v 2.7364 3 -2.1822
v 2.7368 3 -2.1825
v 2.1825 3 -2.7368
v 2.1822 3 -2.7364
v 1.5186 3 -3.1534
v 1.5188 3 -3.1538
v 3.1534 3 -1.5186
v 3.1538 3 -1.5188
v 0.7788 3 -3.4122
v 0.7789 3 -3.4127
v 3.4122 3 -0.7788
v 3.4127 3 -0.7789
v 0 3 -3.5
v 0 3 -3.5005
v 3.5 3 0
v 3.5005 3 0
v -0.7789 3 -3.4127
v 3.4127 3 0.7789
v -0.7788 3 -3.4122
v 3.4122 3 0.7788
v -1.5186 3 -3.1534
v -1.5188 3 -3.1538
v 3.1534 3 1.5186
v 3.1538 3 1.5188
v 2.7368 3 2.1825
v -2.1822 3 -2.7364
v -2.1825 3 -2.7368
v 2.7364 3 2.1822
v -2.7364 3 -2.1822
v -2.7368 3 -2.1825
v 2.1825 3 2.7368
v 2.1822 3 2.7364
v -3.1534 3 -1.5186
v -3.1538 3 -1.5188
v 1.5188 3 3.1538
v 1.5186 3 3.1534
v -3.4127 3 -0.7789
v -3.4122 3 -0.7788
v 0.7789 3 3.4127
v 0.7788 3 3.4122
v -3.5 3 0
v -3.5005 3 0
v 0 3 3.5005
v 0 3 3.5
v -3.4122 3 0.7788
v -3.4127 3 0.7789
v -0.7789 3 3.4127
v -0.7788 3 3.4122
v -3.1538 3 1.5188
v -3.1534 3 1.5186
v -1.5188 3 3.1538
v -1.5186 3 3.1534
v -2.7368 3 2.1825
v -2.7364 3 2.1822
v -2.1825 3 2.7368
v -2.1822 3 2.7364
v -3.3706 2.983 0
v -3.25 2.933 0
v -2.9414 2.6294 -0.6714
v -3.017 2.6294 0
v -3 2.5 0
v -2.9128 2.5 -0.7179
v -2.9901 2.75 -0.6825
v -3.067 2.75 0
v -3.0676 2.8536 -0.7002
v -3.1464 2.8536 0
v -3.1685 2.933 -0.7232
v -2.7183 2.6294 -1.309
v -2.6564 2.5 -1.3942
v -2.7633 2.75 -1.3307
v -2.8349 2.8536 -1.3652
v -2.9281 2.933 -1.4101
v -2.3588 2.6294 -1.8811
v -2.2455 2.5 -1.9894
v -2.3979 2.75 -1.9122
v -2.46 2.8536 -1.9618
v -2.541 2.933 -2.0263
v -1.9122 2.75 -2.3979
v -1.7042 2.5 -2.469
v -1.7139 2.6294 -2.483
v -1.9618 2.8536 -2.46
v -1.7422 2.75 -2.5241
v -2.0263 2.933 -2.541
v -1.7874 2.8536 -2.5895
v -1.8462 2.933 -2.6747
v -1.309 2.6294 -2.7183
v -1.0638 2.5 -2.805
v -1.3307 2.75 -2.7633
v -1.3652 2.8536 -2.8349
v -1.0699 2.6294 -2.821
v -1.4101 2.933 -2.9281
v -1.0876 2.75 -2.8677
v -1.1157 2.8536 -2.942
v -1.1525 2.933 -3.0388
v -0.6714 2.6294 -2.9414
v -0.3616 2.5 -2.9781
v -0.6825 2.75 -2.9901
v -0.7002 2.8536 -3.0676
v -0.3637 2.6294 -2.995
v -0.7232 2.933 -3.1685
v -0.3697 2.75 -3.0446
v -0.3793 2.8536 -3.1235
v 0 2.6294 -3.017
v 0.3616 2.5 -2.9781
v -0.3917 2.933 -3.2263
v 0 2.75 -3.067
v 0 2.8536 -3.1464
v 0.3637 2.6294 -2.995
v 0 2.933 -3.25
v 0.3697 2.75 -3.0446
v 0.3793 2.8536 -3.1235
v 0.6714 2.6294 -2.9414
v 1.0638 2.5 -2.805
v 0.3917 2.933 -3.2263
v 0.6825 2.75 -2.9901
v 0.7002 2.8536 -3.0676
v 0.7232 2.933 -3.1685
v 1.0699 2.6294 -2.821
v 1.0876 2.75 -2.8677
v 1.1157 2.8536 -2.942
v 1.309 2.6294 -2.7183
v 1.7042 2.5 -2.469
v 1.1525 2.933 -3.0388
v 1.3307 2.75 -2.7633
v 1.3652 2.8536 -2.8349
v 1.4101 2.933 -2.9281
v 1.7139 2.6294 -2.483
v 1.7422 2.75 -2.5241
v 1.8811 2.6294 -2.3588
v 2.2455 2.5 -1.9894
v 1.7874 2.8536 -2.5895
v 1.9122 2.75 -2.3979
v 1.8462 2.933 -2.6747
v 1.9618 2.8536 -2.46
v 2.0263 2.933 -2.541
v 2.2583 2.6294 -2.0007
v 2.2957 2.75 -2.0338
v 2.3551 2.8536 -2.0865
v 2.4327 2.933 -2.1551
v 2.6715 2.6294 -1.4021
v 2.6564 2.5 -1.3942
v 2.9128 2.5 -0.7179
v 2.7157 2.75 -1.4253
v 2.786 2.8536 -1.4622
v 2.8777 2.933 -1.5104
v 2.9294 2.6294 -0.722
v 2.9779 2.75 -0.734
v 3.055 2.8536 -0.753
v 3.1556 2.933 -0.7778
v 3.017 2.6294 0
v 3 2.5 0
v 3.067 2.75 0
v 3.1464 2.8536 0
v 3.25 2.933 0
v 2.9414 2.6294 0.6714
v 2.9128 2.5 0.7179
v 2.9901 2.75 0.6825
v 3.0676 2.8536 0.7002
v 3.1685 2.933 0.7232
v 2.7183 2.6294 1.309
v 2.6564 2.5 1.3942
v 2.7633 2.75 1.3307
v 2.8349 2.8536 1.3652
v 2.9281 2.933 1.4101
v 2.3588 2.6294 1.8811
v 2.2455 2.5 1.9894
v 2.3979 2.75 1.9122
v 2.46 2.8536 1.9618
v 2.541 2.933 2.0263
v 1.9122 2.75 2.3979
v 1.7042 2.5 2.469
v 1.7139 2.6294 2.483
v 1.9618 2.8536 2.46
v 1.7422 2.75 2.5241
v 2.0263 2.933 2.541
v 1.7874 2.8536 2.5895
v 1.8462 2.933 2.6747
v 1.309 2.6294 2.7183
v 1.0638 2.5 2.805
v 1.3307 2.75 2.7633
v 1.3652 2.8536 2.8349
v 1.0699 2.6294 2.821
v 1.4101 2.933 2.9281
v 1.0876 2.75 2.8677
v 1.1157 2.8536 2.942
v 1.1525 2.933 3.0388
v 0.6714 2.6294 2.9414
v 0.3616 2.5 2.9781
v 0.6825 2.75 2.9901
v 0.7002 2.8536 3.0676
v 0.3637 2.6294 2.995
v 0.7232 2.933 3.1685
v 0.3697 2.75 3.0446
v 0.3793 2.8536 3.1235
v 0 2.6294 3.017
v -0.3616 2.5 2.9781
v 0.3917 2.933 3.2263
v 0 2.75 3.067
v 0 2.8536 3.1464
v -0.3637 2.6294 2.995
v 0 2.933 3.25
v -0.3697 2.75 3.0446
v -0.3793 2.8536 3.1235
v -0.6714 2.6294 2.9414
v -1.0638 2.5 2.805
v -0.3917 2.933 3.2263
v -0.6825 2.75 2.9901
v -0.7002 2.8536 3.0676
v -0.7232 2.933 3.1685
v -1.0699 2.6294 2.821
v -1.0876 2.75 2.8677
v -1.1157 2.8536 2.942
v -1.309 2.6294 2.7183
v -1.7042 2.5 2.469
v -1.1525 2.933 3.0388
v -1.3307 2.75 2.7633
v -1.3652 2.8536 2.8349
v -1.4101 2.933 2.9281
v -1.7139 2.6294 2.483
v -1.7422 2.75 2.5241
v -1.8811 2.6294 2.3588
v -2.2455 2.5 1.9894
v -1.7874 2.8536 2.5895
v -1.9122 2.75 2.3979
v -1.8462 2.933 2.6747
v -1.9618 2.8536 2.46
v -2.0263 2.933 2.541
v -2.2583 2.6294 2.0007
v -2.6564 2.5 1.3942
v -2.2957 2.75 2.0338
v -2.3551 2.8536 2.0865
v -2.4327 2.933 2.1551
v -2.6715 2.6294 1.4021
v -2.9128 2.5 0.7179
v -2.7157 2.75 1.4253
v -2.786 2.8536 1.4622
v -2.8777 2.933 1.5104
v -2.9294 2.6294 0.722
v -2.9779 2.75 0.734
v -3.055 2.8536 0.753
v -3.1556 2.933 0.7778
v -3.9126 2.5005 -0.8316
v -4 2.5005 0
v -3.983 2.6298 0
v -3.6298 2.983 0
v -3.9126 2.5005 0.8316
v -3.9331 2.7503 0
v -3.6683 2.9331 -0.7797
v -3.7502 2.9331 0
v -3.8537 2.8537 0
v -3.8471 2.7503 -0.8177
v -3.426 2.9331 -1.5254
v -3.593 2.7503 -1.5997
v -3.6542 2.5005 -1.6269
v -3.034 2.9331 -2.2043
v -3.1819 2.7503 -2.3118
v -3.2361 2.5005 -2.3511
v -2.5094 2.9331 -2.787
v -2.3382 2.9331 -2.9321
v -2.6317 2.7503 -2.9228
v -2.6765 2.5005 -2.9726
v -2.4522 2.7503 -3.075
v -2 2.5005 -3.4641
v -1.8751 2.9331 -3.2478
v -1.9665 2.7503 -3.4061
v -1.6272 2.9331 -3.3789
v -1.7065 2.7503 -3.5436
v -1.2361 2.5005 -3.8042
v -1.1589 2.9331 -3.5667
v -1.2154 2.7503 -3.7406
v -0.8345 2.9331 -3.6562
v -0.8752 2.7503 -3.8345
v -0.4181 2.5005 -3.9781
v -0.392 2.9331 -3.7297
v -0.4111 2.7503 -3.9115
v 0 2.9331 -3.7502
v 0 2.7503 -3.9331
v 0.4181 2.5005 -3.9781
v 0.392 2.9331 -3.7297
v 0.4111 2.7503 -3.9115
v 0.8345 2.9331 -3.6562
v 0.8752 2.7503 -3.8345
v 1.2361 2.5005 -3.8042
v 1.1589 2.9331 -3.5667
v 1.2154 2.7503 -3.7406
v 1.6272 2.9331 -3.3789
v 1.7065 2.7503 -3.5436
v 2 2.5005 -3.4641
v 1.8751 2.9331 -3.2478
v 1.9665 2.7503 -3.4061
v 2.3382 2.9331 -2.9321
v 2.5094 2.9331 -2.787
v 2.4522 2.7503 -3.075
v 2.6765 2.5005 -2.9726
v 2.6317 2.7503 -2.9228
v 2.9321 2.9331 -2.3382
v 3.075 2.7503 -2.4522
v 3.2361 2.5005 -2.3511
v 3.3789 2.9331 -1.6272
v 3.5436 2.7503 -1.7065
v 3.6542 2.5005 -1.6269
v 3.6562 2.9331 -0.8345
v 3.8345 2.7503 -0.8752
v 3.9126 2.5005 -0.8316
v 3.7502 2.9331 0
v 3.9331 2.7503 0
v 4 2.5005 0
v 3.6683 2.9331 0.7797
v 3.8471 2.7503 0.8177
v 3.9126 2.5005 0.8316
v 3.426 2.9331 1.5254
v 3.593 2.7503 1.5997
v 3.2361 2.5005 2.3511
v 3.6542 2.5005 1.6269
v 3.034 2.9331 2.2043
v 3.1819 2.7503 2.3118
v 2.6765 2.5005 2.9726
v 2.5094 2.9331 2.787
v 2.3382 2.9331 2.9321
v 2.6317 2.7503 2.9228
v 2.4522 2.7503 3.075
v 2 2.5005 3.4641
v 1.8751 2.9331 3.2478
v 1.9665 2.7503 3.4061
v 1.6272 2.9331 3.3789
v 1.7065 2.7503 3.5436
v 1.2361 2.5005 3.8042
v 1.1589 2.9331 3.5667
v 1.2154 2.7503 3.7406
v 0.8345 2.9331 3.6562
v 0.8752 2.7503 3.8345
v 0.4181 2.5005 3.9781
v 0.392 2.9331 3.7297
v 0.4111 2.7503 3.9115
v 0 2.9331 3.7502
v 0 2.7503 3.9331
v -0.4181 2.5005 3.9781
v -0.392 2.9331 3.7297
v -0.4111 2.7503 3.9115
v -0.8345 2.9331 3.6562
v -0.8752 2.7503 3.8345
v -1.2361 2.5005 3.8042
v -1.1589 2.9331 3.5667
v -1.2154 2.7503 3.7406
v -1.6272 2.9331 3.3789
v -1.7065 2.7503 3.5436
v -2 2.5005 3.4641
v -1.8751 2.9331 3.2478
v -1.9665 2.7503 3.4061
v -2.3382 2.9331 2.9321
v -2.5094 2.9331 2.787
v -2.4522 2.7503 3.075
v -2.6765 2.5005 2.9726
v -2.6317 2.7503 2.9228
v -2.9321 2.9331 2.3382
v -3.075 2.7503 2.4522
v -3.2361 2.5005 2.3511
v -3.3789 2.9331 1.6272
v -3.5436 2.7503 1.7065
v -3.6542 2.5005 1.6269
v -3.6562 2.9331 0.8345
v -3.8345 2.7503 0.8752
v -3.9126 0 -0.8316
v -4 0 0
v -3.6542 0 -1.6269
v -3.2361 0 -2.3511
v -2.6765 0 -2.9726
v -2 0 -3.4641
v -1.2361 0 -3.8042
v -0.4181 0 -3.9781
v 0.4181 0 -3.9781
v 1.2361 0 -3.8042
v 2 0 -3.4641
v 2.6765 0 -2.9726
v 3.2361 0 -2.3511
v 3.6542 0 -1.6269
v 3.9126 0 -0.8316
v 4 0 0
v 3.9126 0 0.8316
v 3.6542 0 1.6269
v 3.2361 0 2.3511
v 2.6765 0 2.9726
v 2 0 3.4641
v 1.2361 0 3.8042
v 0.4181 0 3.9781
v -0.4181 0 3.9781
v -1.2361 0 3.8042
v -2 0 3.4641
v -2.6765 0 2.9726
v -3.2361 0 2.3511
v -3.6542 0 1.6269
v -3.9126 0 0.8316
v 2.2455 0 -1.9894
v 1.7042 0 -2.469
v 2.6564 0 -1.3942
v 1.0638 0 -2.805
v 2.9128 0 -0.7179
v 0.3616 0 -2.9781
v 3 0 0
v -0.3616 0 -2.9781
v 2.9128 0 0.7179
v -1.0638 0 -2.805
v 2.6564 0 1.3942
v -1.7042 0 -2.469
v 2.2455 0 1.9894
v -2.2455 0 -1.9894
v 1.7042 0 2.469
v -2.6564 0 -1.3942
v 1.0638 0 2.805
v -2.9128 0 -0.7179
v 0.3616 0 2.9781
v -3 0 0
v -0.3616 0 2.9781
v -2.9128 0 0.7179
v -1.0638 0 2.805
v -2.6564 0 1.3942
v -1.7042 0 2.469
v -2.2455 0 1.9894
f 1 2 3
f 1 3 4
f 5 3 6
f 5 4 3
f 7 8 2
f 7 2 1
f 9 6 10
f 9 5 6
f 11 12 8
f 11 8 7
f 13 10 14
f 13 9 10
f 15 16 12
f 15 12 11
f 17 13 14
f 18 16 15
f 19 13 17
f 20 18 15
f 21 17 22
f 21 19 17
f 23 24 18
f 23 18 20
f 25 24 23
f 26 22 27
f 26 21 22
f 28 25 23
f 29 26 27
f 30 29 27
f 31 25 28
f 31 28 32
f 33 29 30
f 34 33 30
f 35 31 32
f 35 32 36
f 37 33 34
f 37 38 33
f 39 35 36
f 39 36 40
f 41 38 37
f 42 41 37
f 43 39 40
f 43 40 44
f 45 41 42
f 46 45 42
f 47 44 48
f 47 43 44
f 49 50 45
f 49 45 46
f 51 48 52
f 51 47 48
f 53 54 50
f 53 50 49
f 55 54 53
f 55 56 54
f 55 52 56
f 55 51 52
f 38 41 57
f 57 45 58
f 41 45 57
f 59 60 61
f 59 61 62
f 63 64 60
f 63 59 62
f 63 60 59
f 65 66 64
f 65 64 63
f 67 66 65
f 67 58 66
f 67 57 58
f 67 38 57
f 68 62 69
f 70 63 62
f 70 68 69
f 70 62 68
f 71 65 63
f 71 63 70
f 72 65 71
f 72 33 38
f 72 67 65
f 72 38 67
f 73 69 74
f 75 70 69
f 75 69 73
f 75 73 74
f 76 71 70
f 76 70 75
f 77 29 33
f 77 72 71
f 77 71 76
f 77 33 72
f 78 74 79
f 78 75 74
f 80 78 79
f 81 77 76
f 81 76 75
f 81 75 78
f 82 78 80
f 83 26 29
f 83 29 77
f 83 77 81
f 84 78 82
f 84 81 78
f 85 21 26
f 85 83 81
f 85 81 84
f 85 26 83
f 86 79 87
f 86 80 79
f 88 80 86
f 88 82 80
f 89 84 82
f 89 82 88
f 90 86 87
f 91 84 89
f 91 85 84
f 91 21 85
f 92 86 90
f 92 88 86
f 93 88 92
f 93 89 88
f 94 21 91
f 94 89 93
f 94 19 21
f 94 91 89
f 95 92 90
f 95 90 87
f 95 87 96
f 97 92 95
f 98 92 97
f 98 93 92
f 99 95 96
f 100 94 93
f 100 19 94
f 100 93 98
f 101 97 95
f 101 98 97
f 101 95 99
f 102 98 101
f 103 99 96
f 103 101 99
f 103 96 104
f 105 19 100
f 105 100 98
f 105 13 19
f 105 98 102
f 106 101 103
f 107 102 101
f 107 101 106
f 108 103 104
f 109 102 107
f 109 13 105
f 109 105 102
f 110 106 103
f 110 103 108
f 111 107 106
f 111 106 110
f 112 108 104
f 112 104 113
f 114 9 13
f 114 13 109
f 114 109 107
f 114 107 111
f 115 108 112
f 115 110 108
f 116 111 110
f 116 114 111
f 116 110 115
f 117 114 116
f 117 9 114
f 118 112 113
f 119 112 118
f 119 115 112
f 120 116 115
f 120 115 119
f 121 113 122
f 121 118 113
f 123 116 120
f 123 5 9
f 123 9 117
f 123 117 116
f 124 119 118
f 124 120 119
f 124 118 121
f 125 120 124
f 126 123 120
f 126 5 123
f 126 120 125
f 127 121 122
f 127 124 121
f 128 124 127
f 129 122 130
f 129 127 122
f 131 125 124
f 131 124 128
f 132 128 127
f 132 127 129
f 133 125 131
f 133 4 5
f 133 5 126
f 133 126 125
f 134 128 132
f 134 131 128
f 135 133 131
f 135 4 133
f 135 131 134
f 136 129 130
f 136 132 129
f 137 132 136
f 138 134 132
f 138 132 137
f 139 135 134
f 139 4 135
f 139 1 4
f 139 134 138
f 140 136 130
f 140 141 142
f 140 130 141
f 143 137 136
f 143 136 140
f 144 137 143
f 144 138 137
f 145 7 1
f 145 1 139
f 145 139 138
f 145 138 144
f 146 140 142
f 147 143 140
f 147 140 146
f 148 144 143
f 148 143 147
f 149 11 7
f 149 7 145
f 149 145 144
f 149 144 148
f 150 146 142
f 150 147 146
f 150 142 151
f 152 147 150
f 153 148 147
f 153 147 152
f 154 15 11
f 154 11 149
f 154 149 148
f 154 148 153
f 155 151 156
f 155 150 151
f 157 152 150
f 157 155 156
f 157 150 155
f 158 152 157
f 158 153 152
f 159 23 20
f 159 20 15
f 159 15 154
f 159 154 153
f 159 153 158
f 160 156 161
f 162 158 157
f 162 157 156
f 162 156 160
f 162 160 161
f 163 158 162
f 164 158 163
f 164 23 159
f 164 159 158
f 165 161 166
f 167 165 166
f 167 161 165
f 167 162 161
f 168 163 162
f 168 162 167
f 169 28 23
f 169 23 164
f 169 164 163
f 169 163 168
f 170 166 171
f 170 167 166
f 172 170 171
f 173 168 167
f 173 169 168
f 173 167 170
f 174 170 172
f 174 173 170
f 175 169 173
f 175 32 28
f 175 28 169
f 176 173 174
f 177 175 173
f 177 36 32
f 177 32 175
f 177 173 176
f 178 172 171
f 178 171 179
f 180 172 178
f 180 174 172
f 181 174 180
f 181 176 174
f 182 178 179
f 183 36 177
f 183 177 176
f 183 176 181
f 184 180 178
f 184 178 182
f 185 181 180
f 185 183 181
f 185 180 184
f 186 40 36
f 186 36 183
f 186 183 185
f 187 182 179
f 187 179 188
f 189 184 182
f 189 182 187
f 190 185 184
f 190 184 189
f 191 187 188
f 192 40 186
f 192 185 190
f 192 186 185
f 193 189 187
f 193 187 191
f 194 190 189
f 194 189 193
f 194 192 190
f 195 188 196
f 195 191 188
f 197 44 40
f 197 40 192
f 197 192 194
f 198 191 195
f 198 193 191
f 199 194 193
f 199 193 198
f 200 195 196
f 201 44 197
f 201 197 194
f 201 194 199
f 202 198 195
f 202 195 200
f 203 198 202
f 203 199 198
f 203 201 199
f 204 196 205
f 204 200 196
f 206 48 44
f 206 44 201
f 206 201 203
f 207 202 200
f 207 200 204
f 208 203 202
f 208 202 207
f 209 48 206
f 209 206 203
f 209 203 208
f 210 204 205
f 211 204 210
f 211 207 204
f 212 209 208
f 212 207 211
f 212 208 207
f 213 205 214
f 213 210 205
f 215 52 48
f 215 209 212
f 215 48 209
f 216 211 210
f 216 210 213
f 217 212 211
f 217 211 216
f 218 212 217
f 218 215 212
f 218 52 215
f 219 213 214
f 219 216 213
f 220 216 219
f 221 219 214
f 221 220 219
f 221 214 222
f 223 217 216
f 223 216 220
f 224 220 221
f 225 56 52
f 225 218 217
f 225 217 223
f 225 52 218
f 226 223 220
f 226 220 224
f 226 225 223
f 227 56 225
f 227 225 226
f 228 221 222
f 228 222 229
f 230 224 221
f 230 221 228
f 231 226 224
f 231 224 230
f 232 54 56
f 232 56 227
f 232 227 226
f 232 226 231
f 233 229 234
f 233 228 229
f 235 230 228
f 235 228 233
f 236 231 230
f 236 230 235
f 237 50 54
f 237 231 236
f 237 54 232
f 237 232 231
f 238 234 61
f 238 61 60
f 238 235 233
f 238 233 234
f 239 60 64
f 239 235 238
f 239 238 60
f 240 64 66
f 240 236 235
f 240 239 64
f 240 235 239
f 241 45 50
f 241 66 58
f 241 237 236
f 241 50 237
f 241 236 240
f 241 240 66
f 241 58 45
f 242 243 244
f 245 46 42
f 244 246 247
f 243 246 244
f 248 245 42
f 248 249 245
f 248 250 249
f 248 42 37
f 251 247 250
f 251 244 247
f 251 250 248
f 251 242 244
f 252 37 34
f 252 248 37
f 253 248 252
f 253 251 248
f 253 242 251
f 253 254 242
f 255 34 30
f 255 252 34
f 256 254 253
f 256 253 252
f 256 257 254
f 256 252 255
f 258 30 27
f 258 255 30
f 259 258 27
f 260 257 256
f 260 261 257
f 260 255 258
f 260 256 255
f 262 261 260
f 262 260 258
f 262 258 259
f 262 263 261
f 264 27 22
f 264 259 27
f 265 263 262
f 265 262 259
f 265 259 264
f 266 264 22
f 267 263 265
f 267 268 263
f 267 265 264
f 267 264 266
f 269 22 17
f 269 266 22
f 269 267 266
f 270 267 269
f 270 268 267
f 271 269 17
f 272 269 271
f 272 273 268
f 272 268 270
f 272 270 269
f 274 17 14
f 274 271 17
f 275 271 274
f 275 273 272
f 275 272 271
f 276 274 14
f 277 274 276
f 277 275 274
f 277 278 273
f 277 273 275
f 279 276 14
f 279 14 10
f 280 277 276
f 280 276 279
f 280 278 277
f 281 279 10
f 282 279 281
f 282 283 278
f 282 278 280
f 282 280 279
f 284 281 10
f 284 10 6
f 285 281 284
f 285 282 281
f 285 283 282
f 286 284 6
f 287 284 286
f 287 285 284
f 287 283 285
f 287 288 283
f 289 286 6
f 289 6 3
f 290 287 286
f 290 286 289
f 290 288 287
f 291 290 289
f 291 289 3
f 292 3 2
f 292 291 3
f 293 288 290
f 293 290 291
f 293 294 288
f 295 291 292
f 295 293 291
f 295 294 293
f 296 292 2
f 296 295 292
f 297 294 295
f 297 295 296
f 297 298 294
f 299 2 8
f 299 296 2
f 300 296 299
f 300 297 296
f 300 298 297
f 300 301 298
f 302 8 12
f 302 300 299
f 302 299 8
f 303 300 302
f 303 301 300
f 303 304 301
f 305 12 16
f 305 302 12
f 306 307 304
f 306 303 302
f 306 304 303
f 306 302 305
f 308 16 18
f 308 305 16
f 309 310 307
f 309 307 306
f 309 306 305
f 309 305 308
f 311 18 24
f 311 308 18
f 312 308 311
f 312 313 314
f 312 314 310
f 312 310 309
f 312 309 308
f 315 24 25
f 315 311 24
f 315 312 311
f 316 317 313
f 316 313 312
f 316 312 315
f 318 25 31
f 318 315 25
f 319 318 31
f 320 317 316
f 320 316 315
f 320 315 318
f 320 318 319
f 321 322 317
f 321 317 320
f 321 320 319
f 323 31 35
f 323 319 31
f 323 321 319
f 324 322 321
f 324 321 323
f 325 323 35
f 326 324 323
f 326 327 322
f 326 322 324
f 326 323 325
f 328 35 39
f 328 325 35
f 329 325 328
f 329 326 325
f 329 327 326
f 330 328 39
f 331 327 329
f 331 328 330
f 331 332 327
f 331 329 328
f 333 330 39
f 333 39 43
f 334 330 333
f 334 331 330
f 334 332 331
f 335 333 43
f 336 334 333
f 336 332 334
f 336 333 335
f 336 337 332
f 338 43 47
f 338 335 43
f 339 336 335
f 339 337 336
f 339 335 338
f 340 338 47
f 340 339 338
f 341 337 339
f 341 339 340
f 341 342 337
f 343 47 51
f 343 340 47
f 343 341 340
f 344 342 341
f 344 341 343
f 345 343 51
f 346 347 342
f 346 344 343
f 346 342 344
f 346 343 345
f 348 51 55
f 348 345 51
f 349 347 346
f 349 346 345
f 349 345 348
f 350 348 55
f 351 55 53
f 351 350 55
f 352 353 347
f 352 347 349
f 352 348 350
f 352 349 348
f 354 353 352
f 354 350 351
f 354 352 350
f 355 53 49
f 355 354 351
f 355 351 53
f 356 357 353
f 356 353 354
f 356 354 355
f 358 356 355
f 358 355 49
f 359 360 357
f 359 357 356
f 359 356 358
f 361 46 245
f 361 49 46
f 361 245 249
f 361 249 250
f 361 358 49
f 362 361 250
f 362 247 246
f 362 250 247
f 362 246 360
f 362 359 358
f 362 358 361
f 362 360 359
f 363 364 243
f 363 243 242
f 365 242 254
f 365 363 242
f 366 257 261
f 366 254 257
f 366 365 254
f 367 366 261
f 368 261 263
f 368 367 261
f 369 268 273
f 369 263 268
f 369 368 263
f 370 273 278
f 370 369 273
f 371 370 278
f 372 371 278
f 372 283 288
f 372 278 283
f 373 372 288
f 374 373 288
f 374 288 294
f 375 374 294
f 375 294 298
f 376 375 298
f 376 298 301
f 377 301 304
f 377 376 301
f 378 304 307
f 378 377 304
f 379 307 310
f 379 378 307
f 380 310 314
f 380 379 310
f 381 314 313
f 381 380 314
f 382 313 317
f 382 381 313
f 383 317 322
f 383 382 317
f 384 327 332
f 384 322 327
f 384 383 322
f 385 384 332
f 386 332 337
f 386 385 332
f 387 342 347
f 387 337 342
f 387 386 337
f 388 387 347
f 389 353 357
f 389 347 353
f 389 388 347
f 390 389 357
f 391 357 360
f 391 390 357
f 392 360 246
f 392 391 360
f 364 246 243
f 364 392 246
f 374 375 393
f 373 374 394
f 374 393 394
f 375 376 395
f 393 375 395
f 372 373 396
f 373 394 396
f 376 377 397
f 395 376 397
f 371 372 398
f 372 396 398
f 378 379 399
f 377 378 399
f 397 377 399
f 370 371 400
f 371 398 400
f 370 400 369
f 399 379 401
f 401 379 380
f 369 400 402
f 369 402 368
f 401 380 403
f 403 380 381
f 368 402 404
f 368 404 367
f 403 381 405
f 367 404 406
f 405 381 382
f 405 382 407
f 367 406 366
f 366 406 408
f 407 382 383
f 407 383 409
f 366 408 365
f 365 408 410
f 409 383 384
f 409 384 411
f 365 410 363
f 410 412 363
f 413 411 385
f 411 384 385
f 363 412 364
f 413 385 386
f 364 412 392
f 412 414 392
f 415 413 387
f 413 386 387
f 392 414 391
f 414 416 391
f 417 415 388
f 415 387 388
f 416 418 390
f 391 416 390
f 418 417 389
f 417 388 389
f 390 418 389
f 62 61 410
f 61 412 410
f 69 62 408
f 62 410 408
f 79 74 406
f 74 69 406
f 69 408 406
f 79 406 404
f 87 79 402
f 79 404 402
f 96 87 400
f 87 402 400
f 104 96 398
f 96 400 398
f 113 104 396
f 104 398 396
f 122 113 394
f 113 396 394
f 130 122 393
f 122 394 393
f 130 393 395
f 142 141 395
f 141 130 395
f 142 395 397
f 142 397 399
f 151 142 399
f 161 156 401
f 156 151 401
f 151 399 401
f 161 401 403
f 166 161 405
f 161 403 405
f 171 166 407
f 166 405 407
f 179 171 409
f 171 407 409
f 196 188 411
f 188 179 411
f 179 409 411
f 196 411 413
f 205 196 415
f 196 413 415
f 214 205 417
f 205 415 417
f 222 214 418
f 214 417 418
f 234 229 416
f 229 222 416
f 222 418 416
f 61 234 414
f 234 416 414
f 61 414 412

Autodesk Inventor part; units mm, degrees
ref_plane "YZ Plane" through (0, 0, 0) normal (1, 0, 0) x (0, 1, 0)
ref_plane "XZ Plane" through (0, 0, 0) normal (0, 1, 0) x (-1, 0, 0)
ref_plane "XY Plane" through (0, 0, 0) normal (0, 0, 1) x (1, 0, 0)
sketch "Sketch1" plane through (0, 0, 0) normal (0, 1, 0) x (-1, 0, 0)
  circle A0 centre (0, 0) radius 4
  circle A1 centre (0, 0) radius 3
extrude "Extrusion1" add sketch "Sketch1" along normal blind 3
fillet "Fillet1" radius 0.5 1 edges at (3, 3, 0)
fillet "Fillet2" radius 0.5 1 edges at (4, 3, 0)
properties part number "Chimera Hetsink Brass Insert" material "Brass"
